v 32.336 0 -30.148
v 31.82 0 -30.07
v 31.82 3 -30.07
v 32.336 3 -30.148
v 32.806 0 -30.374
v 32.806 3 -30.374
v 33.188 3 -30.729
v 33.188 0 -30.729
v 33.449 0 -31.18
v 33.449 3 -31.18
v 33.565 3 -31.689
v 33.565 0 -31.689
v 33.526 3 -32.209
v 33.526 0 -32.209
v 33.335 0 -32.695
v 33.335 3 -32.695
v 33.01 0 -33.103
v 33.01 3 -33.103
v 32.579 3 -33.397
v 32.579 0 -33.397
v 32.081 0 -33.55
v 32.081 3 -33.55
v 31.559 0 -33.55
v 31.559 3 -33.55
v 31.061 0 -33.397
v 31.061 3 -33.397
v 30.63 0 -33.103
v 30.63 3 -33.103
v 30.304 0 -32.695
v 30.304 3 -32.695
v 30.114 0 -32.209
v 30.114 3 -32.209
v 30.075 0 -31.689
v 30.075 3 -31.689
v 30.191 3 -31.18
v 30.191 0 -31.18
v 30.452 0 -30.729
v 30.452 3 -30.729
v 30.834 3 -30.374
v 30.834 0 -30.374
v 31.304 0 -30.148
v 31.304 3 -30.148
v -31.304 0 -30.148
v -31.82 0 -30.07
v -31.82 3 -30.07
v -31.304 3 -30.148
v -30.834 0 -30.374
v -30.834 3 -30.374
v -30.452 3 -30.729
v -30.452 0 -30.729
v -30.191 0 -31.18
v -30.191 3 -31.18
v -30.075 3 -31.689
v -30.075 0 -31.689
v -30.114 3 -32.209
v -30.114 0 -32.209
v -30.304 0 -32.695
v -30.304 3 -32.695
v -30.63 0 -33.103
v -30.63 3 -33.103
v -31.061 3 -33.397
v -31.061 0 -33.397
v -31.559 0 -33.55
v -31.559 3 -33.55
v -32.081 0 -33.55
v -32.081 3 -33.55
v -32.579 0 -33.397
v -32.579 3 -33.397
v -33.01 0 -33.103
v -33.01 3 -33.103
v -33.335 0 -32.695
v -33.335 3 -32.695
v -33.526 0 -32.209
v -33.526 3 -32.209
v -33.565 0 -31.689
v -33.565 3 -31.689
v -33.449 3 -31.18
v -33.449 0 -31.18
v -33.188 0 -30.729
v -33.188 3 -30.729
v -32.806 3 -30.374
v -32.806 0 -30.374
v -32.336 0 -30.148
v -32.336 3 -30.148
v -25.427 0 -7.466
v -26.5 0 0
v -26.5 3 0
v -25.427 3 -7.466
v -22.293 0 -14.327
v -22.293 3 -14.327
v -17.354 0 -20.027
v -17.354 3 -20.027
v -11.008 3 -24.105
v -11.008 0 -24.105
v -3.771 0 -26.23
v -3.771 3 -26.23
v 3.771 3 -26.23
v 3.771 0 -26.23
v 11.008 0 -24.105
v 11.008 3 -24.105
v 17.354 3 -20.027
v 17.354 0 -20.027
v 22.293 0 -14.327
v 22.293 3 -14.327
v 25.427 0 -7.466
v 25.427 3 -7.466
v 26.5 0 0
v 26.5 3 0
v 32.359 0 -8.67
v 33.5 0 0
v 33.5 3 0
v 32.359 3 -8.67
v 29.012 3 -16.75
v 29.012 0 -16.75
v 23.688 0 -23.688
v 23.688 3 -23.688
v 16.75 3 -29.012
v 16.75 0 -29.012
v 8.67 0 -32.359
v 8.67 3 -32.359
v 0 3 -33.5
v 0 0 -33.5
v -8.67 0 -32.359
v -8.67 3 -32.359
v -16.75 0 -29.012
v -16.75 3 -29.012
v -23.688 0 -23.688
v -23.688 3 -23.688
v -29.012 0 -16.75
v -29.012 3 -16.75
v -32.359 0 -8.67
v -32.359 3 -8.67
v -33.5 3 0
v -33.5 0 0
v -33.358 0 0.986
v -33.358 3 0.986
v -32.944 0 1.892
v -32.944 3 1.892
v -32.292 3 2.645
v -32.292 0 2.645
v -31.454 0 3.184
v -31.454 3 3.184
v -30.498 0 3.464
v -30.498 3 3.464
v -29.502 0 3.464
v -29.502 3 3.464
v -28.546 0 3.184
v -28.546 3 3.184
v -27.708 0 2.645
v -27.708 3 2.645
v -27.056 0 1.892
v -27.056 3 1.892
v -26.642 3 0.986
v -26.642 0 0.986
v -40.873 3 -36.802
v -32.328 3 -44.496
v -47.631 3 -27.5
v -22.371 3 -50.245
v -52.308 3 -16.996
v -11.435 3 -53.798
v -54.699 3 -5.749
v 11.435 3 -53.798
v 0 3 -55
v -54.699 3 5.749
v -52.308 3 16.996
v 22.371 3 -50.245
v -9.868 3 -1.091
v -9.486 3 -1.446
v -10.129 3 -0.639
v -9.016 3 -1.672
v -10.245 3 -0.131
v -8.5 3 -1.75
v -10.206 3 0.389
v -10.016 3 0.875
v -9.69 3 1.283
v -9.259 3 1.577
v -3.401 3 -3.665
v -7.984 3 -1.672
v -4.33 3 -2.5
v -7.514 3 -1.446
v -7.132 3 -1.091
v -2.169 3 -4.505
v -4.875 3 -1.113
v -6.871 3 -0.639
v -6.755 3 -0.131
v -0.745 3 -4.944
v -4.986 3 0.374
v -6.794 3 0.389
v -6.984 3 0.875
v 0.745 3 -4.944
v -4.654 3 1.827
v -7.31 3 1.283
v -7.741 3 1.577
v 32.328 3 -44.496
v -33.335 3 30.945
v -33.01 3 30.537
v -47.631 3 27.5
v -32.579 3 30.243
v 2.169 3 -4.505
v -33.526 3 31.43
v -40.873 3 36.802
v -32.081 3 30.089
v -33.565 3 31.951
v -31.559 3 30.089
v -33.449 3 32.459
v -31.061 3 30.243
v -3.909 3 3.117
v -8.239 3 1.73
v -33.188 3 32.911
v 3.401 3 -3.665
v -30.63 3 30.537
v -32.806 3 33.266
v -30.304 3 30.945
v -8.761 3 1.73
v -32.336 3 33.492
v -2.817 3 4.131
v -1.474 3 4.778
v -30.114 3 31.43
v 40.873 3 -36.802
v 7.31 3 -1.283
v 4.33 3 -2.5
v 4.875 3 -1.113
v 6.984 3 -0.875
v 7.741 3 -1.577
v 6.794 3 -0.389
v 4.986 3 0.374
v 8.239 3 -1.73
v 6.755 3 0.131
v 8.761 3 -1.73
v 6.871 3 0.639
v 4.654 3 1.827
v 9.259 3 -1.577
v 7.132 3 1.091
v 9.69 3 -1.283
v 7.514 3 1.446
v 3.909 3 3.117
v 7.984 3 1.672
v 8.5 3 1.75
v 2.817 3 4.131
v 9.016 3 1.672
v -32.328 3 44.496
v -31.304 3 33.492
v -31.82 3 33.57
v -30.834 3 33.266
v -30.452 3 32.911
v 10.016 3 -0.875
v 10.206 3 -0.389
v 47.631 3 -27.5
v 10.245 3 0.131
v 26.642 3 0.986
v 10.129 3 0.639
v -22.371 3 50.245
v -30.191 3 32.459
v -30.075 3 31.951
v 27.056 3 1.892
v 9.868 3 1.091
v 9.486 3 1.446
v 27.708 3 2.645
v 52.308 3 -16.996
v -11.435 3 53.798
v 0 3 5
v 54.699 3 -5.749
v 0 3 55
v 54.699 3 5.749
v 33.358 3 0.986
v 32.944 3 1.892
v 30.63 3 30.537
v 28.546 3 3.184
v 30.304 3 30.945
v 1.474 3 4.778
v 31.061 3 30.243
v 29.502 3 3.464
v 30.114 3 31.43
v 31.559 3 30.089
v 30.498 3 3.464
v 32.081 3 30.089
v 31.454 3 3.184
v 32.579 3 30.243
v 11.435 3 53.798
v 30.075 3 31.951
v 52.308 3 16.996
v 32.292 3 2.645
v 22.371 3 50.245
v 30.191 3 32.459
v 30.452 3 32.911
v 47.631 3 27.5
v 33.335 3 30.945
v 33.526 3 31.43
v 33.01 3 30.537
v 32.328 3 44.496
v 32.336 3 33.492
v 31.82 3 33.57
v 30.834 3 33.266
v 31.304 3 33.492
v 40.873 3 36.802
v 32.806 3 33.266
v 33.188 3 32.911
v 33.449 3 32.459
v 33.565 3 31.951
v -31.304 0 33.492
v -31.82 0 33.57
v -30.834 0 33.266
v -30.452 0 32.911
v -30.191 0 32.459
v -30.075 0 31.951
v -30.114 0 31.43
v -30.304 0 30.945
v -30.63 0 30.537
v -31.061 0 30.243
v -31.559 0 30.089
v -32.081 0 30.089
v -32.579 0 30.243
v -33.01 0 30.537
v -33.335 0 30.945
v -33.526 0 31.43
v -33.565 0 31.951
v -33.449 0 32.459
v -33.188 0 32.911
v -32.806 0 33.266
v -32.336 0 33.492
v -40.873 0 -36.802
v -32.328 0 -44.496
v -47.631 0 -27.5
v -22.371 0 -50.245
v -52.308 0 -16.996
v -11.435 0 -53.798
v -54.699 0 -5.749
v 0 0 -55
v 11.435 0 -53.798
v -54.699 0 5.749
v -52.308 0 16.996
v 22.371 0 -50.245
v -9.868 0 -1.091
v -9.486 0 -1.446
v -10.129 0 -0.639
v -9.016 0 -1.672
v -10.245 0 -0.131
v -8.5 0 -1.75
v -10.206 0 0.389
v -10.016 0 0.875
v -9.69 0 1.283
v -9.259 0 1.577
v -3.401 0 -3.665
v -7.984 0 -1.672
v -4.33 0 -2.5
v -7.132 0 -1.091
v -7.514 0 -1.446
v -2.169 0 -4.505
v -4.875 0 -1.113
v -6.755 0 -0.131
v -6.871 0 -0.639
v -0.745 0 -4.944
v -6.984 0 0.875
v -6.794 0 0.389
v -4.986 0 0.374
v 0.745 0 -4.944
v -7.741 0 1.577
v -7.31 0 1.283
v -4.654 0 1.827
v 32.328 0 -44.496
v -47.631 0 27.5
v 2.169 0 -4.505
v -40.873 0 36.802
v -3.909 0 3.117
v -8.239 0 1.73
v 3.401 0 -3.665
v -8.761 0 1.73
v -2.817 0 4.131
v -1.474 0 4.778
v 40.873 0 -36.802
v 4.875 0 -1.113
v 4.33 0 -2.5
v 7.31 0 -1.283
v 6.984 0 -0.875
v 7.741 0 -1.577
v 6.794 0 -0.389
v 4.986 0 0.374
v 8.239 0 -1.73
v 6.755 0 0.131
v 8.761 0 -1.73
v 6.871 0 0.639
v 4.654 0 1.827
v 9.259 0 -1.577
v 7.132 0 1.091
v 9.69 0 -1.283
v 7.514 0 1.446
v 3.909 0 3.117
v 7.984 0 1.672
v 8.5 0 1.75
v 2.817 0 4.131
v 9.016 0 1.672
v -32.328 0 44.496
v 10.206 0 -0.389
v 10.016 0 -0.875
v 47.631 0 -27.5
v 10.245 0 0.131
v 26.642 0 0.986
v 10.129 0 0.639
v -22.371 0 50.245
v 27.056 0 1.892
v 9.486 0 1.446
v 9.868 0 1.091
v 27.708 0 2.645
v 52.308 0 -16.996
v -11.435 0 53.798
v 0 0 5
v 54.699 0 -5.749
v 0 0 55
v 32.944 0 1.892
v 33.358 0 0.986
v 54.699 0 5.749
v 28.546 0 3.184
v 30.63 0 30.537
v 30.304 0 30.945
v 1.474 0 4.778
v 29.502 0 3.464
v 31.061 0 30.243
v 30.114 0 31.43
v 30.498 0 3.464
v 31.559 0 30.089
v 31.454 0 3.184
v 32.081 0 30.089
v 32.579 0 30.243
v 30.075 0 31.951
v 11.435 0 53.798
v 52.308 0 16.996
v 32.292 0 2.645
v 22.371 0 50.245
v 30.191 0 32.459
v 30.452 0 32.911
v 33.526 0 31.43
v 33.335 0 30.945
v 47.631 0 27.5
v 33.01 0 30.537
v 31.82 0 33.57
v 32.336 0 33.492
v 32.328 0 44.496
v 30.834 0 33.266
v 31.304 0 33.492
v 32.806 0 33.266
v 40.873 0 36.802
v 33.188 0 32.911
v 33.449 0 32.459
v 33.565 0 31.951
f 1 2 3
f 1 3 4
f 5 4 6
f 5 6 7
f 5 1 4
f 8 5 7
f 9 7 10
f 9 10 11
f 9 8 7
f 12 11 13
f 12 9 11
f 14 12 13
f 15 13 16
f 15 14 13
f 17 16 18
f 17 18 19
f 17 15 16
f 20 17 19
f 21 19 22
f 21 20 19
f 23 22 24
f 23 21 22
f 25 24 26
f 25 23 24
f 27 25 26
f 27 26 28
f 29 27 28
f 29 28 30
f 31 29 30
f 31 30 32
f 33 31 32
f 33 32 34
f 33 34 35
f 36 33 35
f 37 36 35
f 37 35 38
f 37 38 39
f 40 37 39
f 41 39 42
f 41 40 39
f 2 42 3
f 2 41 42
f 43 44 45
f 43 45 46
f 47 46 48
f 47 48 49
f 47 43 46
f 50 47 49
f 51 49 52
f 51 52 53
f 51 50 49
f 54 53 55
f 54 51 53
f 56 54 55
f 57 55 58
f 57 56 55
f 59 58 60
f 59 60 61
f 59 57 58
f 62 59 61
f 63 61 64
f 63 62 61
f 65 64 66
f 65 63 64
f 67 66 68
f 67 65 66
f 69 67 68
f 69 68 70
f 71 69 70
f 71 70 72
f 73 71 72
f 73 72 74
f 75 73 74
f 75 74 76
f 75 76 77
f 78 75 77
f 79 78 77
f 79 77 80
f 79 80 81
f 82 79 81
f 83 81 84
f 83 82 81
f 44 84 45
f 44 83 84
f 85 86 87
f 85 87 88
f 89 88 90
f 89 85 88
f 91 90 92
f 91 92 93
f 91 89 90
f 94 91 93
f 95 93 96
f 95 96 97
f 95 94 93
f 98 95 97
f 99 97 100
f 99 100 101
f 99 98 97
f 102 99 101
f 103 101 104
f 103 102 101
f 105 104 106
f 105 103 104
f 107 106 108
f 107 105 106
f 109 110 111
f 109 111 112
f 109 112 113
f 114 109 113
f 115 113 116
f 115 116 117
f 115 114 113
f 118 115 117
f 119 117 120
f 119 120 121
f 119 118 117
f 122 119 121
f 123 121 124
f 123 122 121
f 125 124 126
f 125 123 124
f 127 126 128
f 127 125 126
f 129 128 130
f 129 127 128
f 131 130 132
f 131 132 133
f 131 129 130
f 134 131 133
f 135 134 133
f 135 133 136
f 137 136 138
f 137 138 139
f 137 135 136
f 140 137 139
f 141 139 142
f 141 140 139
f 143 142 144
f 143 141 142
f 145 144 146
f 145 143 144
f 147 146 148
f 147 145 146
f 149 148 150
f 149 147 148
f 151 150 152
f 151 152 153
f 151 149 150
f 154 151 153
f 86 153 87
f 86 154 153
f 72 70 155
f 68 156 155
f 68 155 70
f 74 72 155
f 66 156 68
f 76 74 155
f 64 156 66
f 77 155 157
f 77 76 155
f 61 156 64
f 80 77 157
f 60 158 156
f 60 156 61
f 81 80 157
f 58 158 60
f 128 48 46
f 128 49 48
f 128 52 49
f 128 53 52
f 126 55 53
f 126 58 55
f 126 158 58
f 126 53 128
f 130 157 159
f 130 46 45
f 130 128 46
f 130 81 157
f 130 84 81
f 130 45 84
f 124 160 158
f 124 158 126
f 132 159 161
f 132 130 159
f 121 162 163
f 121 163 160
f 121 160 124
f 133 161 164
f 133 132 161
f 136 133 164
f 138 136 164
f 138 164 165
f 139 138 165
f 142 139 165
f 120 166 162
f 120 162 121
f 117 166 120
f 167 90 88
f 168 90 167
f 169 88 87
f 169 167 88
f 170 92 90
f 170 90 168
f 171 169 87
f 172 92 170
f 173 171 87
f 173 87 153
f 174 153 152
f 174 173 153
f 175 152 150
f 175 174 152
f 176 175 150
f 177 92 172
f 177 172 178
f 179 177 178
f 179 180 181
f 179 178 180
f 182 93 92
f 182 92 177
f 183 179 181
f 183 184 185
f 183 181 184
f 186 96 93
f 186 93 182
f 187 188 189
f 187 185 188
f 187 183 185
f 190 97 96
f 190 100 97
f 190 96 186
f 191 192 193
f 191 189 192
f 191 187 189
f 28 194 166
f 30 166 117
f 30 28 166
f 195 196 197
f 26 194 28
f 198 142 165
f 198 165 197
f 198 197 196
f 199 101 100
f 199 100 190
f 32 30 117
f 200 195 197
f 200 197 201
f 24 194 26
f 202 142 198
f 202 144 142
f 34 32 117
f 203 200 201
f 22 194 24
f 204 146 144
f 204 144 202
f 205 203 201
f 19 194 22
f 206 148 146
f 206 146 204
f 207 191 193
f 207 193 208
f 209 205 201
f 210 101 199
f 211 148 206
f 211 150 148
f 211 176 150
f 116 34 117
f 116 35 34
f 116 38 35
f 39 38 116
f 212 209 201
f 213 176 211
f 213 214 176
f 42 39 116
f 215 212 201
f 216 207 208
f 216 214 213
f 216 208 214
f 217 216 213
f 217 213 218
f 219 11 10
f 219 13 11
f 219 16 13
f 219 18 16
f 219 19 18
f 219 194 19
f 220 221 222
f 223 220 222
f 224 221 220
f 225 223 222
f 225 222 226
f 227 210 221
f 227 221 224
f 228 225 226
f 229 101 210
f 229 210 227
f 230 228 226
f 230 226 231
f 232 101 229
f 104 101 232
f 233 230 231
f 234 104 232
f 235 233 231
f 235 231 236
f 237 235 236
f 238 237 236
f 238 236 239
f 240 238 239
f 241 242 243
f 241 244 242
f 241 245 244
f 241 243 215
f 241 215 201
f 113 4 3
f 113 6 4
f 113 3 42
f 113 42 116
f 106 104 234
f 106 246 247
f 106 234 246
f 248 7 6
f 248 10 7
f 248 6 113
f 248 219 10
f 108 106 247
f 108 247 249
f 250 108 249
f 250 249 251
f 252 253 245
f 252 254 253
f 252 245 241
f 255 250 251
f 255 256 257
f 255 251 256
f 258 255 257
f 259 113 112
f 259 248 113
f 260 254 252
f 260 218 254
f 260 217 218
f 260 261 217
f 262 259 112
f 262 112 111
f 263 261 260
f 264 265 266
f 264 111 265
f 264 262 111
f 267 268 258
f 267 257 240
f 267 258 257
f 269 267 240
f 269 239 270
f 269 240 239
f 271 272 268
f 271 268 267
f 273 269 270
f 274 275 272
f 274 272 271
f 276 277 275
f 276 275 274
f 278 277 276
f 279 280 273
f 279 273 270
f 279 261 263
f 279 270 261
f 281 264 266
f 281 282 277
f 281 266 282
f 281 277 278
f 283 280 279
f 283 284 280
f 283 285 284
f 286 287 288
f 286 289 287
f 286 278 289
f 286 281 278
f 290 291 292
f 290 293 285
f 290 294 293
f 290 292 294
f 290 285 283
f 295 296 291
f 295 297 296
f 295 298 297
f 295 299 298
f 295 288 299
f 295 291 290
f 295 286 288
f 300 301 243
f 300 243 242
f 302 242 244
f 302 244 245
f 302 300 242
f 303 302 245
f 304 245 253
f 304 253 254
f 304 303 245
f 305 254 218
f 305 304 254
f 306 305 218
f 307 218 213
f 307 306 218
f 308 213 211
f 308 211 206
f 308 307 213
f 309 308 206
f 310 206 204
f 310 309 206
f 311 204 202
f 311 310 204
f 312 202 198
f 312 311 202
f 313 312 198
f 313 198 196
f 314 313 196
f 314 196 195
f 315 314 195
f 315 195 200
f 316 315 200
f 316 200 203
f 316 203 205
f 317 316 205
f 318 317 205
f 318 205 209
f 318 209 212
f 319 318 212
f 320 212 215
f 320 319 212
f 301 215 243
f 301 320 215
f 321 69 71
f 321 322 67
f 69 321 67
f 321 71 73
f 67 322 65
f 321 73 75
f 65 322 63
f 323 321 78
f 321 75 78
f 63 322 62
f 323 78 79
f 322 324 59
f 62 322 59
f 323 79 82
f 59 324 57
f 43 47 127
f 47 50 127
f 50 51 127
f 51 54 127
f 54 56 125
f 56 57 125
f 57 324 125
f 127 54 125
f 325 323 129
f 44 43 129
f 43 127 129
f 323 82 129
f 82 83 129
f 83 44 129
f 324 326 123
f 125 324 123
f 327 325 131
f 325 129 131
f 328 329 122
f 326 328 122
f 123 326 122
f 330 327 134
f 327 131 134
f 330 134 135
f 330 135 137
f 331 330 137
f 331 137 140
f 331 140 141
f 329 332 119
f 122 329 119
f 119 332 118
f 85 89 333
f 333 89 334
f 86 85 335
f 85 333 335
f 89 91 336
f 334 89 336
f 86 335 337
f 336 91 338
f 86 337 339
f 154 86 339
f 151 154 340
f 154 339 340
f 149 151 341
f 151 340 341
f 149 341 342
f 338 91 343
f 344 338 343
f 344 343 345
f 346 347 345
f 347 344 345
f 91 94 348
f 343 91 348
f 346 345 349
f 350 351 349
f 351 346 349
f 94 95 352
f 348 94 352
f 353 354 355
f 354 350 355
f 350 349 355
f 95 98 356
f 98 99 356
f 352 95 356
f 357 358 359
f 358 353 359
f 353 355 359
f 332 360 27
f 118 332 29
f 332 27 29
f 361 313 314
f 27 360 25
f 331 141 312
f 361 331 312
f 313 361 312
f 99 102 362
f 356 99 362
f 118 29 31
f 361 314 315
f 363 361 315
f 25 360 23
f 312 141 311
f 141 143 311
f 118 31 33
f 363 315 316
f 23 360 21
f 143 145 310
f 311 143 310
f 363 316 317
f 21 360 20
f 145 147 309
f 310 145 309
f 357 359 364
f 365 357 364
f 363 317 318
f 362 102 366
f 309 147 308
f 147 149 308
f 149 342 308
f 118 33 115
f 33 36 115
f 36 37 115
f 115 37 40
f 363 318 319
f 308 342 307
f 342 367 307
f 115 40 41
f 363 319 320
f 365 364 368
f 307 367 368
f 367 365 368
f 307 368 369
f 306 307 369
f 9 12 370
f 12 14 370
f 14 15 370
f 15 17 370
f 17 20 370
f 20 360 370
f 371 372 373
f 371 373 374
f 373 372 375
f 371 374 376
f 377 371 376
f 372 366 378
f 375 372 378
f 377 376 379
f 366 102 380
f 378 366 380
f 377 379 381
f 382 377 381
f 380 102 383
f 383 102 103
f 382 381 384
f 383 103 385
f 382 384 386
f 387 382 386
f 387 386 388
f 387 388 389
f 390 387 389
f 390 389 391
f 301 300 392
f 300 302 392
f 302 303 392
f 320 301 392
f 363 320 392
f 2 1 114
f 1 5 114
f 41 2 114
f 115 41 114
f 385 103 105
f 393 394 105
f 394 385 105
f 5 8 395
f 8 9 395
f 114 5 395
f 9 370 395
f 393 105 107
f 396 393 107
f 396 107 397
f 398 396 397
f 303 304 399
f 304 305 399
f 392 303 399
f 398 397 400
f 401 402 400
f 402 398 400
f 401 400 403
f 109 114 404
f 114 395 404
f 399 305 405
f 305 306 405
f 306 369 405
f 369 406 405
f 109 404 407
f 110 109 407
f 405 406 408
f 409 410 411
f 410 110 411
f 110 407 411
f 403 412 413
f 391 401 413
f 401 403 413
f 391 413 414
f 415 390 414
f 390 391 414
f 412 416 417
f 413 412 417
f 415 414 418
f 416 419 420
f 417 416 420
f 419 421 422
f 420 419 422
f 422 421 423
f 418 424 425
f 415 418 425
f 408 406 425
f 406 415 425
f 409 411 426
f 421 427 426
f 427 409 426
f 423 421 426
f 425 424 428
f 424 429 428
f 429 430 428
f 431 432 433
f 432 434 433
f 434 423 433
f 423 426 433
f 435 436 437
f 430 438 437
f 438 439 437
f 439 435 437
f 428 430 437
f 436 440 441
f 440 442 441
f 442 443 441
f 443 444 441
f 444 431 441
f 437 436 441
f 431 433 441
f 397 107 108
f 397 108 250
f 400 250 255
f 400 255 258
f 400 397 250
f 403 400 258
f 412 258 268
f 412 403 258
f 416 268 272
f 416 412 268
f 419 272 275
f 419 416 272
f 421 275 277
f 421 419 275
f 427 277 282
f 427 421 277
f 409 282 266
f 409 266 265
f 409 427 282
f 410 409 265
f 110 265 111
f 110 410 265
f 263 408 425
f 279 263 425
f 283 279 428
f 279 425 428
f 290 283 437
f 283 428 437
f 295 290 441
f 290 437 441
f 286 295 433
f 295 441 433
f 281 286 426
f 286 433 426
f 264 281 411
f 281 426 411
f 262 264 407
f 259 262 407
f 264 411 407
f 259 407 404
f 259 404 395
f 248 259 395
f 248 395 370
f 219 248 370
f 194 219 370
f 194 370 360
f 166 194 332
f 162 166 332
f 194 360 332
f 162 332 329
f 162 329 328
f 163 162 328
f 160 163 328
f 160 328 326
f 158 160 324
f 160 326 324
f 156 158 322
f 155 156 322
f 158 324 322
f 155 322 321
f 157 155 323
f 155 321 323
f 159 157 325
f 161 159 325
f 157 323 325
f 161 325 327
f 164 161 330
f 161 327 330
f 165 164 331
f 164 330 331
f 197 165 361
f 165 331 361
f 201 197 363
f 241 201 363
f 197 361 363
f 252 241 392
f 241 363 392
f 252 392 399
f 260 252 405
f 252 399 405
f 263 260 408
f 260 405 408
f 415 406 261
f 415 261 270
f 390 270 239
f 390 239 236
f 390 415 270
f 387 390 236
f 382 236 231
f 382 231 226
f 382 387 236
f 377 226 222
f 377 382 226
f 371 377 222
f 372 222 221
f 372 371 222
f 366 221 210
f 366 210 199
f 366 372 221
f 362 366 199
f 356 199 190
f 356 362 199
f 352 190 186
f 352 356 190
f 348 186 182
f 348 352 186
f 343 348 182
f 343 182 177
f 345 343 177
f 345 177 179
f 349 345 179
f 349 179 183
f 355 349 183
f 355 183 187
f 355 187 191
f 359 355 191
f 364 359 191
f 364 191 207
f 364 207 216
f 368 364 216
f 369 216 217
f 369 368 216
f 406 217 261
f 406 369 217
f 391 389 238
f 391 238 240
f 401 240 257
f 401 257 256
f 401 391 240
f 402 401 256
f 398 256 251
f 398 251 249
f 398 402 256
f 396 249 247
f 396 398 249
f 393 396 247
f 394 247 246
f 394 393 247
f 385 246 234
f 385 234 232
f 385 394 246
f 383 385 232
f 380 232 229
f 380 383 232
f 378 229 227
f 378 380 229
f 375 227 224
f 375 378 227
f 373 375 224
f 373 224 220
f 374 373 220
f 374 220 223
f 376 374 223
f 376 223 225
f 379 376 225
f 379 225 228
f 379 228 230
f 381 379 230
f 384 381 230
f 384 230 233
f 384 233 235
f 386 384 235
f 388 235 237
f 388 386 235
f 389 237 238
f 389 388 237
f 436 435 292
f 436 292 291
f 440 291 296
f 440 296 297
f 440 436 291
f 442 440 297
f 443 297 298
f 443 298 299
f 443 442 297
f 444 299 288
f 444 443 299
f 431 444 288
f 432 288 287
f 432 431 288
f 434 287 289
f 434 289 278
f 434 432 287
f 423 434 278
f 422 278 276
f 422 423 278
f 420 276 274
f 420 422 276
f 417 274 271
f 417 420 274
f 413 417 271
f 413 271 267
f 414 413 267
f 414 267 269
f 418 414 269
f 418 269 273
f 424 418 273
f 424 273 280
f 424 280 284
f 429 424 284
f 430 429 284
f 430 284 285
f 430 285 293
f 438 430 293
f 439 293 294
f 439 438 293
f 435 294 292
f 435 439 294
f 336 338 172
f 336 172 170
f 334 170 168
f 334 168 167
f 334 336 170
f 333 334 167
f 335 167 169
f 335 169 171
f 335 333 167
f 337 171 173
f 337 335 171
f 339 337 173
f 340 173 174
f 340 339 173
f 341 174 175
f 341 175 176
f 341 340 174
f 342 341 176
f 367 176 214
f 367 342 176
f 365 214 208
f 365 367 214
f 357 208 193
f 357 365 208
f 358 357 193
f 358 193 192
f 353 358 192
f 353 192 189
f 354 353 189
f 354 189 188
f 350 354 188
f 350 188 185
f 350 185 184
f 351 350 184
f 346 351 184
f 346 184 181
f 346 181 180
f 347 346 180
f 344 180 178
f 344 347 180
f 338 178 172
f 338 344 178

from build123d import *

# Parameters (mm, degrees)
SKETCH1_R           = 55
SKETCH1_R_2         = 5
SKETCH1_R_3         = 1.75
BOSS_EXTRUDE1_DEPTH = 3


with BuildPart() as part:
    # Sketch1 → Boss-Extrude1 (new body)
    with BuildSketch(Plane(origin=(0, 0, 0), x_dir=(1, 0, 0), z_dir=(0, 1, 0))):
        with Locations(Location((0, 0, 0), (0, 0, 270))):
            Circle(SKETCH1_R)
        with Locations(Location((0, 0, 0), (0, 0, 270))):
            Circle(SKETCH1_R_2, mode=Mode.SUBTRACT)
        with Locations(Location((8.5, 0, 0), (0, 0, 270))):
            Circle(SKETCH1_R_3, mode=Mode.SUBTRACT)
        with Locations(Location((-8.5, 0, 0), (0, 0, 90))):
            Circle(SKETCH1_R_3, mode=Mode.SUBTRACT)
        with Locations(Location((-31.819805153, 31.819805153, 0), (0, 0, 270))):
            Circle(SKETCH1_R_3, mode=Mode.SUBTRACT)
        with Locations(Location((31.819805153, 31.819805153, 0), (0, 0, 270))):
            Circle(SKETCH1_R_3, mode=Mode.SUBTRACT)
        with Locations(Location((31.819805153, -31.819805153, 0), (0, 0, 270))):
            Circle(SKETCH1_R_3, mode=Mode.SUBTRACT)
        with Locations(Location((-31.819805153, -31.819805153, 0), (0, 0, 270))):
            Circle(SKETCH1_R_3, mode=Mode.SUBTRACT)
        with BuildLine():
            ThreePointArc((33.5, 0), (0, 33.5), (-33.5, 0))
            ThreePointArc((-33.5, 0), (-30, -3.5), (-26.5, 0))
            ThreePointArc((-26.5, 0), (0, 26.5), (26.5, 0))
            ThreePointArc((26.5, 0), (30, -3.5), (33.5, 0))
        make_face(mode=Mode.SUBTRACT)
    extrude(amount=BOSS_EXTRUDE1_DEPTH)


solid = part.part
